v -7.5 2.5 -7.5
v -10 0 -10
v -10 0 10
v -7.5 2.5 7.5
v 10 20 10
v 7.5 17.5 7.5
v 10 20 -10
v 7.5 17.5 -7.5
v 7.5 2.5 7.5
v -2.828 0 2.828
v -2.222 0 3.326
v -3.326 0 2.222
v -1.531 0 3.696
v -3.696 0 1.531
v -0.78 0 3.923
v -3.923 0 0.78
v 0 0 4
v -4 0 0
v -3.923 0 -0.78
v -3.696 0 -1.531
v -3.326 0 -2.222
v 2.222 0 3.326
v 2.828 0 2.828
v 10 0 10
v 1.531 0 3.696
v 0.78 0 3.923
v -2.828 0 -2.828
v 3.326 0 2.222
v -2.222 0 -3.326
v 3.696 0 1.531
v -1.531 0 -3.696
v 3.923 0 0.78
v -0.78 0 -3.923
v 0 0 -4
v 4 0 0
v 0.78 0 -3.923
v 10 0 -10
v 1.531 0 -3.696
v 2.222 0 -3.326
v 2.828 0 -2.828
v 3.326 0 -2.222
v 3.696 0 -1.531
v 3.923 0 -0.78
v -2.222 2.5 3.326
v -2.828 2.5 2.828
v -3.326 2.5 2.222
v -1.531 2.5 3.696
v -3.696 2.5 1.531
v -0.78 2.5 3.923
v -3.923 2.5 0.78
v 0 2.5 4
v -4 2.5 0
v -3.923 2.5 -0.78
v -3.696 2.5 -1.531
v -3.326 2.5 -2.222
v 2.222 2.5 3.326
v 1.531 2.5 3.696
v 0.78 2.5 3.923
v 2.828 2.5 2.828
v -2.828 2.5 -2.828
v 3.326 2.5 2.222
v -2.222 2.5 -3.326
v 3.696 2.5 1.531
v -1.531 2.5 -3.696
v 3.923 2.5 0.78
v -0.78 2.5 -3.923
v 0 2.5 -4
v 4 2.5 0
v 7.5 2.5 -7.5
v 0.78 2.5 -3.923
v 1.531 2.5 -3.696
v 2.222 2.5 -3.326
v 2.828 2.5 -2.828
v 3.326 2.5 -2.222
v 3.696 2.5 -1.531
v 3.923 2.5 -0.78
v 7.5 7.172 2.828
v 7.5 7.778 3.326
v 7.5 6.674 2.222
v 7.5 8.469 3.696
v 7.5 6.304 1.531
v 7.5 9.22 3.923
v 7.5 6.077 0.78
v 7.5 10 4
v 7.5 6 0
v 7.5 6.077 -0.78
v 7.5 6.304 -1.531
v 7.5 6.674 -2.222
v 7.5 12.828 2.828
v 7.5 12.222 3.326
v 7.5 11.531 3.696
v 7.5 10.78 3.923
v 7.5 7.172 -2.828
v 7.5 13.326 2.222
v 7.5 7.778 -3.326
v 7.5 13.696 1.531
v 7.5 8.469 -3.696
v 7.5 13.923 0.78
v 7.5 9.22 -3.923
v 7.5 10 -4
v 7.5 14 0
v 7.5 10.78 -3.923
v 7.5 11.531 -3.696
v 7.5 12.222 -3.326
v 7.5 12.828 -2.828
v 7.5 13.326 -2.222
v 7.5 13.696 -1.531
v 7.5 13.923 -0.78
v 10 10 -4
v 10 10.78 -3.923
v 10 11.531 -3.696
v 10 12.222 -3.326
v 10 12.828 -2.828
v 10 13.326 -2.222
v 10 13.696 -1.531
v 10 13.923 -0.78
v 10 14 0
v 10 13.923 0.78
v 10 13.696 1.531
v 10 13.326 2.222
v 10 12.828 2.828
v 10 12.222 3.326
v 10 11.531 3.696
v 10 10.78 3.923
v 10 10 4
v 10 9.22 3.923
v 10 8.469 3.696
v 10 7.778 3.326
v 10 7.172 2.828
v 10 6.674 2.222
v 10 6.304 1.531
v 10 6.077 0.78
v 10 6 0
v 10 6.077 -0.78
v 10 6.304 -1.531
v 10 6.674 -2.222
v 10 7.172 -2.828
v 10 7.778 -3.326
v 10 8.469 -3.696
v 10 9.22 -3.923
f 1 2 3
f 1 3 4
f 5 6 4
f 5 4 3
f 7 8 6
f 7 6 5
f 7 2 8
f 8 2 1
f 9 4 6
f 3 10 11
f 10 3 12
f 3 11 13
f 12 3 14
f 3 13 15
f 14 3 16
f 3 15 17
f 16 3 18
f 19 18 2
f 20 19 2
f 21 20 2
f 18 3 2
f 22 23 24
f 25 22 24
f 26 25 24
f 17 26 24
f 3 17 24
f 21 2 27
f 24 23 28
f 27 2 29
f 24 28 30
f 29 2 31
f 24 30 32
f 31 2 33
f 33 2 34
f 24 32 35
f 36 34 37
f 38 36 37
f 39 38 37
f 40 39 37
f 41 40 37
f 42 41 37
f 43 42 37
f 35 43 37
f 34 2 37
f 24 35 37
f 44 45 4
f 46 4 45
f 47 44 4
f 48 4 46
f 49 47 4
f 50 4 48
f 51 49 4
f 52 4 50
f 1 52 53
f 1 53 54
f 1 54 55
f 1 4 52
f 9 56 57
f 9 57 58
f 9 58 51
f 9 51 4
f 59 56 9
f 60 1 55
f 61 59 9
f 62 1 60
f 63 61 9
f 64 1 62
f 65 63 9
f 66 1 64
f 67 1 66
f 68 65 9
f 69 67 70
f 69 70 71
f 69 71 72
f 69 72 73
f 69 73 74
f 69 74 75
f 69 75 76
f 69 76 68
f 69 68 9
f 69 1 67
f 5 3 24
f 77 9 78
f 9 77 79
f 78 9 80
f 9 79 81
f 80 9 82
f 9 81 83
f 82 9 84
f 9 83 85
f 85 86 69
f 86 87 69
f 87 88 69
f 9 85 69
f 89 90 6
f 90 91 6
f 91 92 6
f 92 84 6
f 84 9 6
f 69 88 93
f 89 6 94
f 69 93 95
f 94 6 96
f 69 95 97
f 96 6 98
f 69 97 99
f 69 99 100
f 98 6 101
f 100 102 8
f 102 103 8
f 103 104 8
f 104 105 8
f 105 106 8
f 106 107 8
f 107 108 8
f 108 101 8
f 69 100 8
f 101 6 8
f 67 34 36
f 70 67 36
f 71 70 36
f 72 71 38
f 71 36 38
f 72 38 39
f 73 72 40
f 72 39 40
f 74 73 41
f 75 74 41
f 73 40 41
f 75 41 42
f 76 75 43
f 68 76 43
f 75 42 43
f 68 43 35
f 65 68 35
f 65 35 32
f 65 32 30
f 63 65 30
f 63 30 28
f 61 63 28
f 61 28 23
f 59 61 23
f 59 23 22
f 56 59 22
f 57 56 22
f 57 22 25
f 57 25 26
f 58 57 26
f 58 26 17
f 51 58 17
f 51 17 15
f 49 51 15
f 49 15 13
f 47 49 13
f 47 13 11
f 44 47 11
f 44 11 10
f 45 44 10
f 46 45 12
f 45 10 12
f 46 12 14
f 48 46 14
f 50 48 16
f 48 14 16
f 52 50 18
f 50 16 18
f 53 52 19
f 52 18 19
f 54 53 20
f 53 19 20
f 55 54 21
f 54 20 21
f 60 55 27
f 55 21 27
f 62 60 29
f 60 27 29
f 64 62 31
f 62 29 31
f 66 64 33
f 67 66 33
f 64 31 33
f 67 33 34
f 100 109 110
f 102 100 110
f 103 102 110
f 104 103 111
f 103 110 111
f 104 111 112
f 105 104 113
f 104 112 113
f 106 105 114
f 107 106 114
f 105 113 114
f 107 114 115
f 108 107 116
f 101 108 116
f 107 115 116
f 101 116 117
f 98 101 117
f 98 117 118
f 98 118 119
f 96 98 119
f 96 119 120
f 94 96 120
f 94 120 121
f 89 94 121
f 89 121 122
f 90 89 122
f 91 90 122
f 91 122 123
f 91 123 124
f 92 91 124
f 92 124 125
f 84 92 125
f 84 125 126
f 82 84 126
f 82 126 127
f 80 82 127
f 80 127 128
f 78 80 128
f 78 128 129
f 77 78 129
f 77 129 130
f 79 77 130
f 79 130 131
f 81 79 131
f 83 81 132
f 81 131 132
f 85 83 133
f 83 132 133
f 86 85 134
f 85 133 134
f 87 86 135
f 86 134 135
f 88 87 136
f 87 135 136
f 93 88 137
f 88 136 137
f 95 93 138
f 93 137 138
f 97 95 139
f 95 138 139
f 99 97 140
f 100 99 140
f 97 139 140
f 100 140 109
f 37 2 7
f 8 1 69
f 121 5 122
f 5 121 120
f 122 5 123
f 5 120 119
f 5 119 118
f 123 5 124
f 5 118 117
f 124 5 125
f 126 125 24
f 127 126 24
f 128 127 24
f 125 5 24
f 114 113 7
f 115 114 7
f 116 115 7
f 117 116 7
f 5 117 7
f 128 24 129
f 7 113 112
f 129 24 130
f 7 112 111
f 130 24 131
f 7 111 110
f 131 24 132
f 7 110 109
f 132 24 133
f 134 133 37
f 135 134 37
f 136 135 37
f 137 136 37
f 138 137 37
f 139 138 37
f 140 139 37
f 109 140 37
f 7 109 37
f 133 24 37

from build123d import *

# Parameters (mm, degrees)
SKETCH1_W               = 20
SKETCH1_H               = 20
BOSS_EXTRUDE1_DEPTH     = 20
CUT_EXTRUDE1_DEPTH      = 31
CUT_EXTRUDE1_DEPTH_BACK = 31
SKETCH3_R               = 4
CUT_EXTRUDE2_DEPTH      = 31
SKETCH4_R               = 4
CUT_EXTRUDE3_DEPTH      = 25.494897428
SKETCH5_W               = 15
SKETCH5_H               = 15
CUT_EXTRUDE5_DEPTH      = 17.5


with BuildPart() as part:
    # Sketch1 → Boss-Extrude1 (new body)
    with BuildSketch(Plane(origin=(0, 0, 0), x_dir=(1, 0, 0), z_dir=(0, 1, 0))):
        Rectangle(SKETCH1_W, SKETCH1_H)
    extrude(amount=BOSS_EXTRUDE1_DEPTH)

    # Sketch2 → Cut-Extrude1 (cut, two sides: drawn at the far end of the back side and taken through both)
    with BuildSketch(Plane.XY.offset(10).offset(-CUT_EXTRUDE1_DEPTH_BACK)):
        Polygon((-10, 0), (10, 20), (-10, 20), align=None)
    extrude(amount=CUT_EXTRUDE1_DEPTH + CUT_EXTRUDE1_DEPTH_BACK, mode=Mode.SUBTRACT)

    # Sketch3 → Cut-Extrude2 (cut, through all)
    with BuildSketch(Plane(origin=(10, 0, 0), x_dir=(0, 0, -1), z_dir=(1, 0, 0))):
        with Locations((0, 10)):
            Circle(SKETCH3_R)
    extrude(amount=-CUT_EXTRUDE2_DEPTH, mode=Mode.SUBTRACT)

    # Sketch4 → Cut-Extrude3 (cut, through all)
    with BuildSketch(Plane.XZ):
        with Locations(Location((0, 0, 0), (0, 0, 270))):
            Circle(SKETCH4_R)
    extrude(amount=-CUT_EXTRUDE3_DEPTH, mode=Mode.SUBTRACT)

    # Sketch5 → Cut-Extrude5 (cut)
    with BuildSketch(Plane(origin=(0, 20, 0), x_dir=(1, 0, 0), z_dir=(0, 1, 0))):
        Rectangle(SKETCH5_W, SKETCH5_H)
    extrude(amount=-CUT_EXTRUDE5_DEPTH, mode=Mode.SUBTRACT)


solid = part.part
